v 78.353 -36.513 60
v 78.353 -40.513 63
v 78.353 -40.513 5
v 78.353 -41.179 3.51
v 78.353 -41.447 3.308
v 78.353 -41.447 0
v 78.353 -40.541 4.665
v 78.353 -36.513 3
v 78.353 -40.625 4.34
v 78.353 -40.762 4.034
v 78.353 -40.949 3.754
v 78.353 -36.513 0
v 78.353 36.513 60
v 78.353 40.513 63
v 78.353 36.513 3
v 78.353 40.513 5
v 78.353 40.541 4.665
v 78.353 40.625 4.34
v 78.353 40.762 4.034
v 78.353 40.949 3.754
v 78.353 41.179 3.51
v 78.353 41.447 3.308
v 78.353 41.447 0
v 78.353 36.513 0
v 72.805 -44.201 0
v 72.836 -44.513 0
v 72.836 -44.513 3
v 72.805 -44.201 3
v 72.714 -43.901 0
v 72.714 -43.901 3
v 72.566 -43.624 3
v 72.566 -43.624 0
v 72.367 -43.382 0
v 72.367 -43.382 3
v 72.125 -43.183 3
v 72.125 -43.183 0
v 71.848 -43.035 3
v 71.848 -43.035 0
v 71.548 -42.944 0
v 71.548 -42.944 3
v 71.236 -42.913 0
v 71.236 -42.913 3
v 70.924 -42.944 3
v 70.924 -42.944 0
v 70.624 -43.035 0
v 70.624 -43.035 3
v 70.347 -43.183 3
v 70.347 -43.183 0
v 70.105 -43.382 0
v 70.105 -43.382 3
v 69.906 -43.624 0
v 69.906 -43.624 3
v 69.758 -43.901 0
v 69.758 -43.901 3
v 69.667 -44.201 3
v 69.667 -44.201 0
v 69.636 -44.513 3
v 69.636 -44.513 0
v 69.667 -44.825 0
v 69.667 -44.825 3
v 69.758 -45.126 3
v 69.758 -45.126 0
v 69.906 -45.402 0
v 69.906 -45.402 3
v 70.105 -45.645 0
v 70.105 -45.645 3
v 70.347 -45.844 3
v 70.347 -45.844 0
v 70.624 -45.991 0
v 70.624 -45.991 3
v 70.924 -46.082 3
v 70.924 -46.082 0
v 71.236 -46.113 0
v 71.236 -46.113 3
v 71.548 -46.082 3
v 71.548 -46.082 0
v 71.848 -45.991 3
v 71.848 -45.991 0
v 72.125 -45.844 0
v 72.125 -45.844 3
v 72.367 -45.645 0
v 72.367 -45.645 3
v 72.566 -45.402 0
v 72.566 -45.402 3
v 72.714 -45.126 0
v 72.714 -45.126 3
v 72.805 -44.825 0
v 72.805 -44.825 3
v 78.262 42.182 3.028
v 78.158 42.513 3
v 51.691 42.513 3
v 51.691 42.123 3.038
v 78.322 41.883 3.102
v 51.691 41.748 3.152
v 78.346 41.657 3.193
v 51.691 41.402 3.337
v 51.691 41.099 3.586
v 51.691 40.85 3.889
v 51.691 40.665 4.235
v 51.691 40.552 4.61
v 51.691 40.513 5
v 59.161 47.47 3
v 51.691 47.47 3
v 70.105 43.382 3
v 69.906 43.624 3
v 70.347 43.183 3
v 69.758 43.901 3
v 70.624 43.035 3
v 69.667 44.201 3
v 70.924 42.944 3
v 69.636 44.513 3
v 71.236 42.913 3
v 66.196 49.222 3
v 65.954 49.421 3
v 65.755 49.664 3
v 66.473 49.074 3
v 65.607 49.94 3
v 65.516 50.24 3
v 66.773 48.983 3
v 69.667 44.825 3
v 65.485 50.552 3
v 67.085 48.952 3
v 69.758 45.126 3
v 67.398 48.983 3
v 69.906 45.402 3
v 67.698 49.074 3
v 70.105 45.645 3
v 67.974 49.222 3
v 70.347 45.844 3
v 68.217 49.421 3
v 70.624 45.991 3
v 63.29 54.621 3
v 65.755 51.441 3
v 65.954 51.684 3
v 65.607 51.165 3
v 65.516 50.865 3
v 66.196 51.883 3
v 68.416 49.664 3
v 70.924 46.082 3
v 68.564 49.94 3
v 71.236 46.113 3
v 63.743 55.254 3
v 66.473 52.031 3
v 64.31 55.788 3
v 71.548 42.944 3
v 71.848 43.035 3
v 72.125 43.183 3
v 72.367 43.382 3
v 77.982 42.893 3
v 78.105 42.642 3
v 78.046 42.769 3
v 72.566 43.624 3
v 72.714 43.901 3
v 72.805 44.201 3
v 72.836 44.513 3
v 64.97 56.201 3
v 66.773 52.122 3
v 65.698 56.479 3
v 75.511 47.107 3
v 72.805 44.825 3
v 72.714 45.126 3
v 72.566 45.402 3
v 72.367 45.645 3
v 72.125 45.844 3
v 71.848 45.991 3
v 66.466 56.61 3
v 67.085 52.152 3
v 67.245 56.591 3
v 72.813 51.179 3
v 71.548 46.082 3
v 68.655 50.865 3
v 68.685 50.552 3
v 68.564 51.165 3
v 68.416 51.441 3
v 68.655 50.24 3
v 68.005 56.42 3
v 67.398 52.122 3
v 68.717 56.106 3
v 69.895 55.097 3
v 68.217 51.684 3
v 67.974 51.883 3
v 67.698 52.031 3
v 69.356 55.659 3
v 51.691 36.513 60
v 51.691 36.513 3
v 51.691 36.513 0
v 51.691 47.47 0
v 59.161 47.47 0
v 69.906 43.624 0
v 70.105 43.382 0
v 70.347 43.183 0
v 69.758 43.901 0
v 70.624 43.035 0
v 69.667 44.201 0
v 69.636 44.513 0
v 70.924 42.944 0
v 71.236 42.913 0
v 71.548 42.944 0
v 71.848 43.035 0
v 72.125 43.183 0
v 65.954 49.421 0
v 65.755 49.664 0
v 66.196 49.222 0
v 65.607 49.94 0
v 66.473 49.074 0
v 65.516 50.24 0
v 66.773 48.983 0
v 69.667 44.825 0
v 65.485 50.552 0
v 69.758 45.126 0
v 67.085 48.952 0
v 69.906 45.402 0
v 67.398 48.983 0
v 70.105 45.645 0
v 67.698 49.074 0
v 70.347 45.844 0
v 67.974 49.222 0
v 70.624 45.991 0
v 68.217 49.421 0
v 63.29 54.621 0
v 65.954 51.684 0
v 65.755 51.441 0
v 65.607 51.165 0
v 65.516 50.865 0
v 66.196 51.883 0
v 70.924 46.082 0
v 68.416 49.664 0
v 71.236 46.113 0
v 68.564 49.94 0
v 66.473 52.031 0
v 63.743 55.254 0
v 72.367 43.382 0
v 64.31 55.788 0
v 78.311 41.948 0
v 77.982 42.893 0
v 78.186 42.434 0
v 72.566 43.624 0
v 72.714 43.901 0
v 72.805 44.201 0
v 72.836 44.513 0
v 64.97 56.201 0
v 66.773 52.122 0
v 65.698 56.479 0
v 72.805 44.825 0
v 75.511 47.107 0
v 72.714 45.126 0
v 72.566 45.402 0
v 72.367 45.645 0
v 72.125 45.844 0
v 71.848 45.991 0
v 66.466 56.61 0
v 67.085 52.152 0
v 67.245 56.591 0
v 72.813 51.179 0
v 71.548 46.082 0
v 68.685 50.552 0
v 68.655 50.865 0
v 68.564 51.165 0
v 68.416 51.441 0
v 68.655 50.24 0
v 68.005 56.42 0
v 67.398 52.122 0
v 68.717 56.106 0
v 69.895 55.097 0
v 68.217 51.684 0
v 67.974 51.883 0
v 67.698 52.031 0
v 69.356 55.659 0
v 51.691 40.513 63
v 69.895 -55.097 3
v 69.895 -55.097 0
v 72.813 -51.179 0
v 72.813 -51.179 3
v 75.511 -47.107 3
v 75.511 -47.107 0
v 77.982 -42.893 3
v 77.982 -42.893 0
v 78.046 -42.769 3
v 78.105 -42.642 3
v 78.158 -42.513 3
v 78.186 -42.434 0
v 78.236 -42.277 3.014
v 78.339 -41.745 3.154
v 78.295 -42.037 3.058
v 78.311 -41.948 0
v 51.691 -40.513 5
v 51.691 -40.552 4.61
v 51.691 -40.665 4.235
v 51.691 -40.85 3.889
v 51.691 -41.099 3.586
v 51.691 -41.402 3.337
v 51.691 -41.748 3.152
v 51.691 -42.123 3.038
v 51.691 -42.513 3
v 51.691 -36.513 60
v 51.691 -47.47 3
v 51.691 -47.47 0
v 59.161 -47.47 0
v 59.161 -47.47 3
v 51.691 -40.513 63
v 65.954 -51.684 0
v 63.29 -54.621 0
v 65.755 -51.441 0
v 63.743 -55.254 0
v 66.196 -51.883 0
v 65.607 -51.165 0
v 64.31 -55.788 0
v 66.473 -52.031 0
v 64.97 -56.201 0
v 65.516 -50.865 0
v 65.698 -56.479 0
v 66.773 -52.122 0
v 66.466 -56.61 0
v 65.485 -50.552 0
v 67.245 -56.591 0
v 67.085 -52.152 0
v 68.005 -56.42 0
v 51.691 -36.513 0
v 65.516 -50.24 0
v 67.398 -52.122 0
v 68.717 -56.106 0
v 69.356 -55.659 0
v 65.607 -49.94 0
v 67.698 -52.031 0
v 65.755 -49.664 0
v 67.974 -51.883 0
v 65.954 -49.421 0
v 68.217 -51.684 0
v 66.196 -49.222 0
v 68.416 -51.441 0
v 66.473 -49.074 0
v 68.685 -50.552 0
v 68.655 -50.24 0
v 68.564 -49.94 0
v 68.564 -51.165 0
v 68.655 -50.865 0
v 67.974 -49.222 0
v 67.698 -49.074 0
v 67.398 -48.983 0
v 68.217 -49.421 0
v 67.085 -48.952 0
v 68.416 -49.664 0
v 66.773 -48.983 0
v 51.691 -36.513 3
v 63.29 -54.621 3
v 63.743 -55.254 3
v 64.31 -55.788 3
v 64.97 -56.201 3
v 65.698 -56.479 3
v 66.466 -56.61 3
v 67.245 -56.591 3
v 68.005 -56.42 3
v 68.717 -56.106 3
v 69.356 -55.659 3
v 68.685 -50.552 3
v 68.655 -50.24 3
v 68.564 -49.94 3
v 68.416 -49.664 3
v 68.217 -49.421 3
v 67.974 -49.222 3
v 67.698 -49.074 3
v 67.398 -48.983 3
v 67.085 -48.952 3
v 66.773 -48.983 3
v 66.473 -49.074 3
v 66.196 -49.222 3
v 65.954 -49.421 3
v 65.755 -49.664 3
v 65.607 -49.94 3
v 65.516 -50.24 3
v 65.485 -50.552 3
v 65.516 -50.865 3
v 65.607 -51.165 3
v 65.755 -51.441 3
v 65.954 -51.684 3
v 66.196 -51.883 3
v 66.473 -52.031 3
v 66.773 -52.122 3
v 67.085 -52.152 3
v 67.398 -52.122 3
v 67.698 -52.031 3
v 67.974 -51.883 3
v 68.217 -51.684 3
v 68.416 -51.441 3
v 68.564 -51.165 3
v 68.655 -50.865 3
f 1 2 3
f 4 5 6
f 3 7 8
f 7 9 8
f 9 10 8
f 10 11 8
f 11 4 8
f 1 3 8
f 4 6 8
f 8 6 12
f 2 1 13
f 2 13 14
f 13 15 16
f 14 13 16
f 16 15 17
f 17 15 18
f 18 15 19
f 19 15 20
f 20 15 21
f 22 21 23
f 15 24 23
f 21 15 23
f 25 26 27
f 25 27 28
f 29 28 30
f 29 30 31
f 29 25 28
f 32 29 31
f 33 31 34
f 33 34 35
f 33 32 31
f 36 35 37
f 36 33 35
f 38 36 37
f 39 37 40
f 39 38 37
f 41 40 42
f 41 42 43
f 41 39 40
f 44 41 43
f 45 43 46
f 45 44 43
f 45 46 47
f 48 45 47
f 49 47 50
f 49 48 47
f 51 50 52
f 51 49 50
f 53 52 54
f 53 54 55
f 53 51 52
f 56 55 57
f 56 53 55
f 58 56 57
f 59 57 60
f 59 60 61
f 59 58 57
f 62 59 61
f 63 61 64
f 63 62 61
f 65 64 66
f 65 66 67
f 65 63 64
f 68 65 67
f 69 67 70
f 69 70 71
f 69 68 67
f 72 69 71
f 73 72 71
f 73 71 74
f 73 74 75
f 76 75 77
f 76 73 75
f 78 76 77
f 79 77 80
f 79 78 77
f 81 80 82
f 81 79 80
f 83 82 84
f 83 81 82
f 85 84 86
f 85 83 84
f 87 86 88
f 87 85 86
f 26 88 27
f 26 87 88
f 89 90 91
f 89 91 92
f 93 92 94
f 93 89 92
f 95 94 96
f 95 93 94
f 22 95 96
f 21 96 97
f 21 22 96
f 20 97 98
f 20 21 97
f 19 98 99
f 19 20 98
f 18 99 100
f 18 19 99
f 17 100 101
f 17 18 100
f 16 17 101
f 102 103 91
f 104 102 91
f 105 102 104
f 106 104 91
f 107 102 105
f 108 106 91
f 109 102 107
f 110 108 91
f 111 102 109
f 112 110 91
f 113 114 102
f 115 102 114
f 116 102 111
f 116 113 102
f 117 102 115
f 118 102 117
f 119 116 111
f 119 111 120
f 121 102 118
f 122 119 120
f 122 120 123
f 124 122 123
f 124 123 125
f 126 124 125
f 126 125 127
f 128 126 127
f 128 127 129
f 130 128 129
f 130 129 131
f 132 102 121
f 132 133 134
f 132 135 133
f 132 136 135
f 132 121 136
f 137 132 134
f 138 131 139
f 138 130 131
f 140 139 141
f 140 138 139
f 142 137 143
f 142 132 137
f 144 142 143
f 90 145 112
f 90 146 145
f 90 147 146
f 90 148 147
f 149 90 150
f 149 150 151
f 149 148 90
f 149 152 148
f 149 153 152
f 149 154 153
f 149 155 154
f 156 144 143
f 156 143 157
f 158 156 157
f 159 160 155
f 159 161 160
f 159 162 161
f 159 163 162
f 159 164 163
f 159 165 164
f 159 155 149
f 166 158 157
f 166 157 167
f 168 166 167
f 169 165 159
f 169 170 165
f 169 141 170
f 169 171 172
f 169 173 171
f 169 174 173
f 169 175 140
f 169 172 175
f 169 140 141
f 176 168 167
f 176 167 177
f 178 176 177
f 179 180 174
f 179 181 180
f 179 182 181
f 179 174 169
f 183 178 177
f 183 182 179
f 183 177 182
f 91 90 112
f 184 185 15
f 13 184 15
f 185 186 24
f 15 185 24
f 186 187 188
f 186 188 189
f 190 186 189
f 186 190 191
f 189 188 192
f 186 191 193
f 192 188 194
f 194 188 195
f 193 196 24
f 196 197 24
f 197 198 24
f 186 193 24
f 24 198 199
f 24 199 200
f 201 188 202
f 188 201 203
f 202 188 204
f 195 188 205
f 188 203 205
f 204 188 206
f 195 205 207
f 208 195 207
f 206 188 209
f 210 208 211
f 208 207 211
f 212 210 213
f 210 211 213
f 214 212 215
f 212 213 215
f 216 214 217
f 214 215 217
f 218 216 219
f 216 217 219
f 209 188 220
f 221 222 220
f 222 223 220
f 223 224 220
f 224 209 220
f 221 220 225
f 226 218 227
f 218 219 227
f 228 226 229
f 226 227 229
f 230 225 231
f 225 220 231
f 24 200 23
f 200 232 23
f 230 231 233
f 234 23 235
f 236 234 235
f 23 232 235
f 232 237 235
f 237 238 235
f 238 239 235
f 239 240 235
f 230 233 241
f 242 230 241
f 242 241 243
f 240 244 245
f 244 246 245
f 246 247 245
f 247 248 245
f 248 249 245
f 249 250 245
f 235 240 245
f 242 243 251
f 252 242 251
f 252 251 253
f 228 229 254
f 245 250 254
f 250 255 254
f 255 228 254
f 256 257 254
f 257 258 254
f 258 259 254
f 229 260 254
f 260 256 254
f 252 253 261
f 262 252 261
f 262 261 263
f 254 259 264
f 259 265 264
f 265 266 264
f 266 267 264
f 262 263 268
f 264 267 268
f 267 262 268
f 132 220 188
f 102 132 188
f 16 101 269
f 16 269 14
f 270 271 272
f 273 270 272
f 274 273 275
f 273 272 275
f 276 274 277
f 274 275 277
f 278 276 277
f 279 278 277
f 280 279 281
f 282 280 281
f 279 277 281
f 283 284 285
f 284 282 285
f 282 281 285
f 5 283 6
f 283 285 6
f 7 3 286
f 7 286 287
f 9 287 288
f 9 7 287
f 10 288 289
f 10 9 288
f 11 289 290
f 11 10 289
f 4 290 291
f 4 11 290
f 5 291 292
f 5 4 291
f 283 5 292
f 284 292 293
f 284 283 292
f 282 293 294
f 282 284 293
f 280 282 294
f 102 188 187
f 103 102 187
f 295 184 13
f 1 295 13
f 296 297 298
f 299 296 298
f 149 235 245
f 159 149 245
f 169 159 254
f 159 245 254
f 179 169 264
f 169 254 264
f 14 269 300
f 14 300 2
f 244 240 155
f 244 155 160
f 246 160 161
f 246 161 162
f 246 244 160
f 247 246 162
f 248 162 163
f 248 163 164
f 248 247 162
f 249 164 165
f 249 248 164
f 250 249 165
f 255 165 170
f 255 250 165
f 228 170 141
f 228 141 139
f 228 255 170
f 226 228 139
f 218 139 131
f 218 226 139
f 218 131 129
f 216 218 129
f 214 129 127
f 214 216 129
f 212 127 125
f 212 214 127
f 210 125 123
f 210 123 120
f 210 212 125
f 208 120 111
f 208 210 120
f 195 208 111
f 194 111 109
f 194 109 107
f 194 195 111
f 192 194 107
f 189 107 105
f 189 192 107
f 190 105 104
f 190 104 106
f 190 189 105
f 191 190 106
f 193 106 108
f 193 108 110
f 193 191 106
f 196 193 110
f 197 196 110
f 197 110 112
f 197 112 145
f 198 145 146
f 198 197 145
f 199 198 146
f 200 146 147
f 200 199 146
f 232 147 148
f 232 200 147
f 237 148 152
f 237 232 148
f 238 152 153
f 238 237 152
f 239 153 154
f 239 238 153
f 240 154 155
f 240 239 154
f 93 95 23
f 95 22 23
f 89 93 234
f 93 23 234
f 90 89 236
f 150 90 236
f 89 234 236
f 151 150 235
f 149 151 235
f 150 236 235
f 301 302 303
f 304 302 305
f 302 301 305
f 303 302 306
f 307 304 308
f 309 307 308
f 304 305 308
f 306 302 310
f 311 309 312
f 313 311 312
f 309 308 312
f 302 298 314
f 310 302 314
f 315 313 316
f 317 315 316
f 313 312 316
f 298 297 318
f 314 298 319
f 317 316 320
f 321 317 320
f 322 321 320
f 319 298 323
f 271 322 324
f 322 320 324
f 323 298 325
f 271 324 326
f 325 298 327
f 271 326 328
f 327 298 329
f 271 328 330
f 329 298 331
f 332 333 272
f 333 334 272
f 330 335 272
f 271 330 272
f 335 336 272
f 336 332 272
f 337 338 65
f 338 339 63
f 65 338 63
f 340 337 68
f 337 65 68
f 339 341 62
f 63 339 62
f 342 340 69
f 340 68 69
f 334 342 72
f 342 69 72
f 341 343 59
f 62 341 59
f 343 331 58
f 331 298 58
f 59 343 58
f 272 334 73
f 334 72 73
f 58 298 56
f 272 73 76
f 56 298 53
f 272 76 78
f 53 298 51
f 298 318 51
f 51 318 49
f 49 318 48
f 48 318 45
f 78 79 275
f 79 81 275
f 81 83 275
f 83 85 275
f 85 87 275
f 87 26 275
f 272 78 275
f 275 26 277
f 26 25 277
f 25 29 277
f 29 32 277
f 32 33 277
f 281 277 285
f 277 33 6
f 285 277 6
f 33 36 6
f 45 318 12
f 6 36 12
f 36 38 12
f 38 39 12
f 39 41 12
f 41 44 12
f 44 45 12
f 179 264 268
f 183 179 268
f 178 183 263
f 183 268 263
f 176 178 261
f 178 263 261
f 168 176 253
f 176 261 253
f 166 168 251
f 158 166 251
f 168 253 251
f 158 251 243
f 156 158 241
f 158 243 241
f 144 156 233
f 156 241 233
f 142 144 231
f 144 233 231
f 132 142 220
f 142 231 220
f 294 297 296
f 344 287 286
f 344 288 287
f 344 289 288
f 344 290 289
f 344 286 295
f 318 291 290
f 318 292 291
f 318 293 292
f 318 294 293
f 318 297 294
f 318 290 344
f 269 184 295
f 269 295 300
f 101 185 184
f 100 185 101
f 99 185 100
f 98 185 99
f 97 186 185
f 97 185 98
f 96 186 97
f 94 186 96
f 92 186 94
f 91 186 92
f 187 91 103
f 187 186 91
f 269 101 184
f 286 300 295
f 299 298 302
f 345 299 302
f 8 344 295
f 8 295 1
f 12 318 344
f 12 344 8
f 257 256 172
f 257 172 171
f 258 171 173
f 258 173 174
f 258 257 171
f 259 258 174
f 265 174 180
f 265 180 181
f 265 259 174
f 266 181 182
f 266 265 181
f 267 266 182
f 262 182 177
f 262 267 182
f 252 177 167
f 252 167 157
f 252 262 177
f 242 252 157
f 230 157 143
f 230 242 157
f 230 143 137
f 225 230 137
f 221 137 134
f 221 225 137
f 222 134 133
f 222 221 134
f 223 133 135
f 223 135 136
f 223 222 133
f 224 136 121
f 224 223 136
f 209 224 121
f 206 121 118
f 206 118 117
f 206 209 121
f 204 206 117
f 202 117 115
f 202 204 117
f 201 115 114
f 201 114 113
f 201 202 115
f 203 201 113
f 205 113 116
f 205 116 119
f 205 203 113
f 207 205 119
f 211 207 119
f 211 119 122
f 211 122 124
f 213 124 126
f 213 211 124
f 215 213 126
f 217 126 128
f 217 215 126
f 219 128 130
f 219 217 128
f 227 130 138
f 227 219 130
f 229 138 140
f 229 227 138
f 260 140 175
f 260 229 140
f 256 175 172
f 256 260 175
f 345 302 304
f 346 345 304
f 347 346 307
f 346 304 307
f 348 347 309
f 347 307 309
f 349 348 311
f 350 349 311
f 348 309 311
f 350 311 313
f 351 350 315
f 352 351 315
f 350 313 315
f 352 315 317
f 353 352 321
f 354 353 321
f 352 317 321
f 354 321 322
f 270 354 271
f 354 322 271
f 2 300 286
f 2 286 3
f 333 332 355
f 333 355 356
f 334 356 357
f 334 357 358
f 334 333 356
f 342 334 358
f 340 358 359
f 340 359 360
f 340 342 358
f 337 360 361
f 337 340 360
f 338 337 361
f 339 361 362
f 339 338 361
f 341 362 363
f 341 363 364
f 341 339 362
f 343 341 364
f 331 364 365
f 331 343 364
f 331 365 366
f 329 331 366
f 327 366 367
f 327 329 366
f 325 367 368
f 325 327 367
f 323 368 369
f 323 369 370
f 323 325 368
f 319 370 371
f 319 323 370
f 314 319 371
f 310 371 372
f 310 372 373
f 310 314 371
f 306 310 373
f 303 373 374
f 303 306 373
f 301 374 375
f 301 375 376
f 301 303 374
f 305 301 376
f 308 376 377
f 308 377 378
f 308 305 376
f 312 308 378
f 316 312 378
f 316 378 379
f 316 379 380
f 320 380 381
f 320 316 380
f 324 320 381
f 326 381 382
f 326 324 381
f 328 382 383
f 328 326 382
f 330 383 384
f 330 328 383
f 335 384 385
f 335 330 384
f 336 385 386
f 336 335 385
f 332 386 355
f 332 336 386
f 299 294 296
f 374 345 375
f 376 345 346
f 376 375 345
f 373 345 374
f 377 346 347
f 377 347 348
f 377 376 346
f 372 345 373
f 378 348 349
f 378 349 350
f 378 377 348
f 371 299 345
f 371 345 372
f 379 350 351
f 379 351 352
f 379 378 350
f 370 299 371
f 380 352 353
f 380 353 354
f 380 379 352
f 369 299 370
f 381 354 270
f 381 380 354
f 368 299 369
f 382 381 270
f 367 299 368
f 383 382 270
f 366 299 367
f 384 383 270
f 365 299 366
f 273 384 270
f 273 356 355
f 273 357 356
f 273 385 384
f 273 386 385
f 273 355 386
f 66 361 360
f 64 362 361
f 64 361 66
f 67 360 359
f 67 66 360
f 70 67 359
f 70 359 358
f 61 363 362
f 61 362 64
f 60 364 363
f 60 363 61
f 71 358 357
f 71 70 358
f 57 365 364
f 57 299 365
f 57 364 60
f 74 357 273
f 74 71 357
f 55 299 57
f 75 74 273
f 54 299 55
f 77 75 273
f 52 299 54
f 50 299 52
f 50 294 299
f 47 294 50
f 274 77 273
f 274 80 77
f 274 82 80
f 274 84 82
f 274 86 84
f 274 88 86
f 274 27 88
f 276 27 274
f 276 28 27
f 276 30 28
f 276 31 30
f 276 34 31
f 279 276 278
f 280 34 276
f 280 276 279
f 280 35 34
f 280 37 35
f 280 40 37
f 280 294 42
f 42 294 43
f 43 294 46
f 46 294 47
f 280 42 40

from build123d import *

# Parameters (mm, degrees)
BOSS_EXTRUDE1_OUTLINE_R = 1.6
BOSS_EXTRUDE1_DEPTH     = 3
SKETCH4_W               = 26.662281873
SKETCH4_H               = 4
BOSS_EXTRUDE2_DEPTH     = 57
SKETCH5_W               = 26.662281873
SKETCH5_H               = 81.026436392
BOSS_EXTRUDE3_DEPTH     = 3
FILLET3_R               = 2


# Read off the part's stored shape, not the designer's step: Boss-Extrude1
with BuildPart() as part:
    # Boss-Extrude1 outline → Boss-Extrude1 (new body)
    # profile 1 of 2: a face of its own
    with BuildSketch(Plane.XY):
        with BuildLine():
            ThreePointArc((63.289582375, -54.620772264), (66.466019523, -56.610414999), (69.895033825, -55.0970439))
            ThreePointArc((69.895033825, -55.0970439), (74.189882191, -49.161584399), (77.981994569, -42.892989206))
            ThreePointArc((77.981994569, -42.892989206), (78.25905658, -42.193542837), (78.353388011, -41.447158109))
            Line((78.353388011, -41.447158109), (78.353388011, -36.513218196))
            Line((78.353388011, -36.513218196), (51.691106138, -36.513218196))
            Line((51.691106138, -36.513218196), (51.691106138, -47.469854476))
            Line((51.691106138, -47.469854476), (59.160998066, -47.469854476))
            Line((59.160998066, -47.469854476), (63.289582375, -54.620772264))
        make_face()
        with Locations((67.085382844, -50.552461945)):
            Circle(BOSS_EXTRUDE1_OUTLINE_R, mode=Mode.SUBTRACT)
        with Locations((71.236040077, -44.513218196)):
            Circle(BOSS_EXTRUDE1_OUTLINE_R, mode=Mode.SUBTRACT)
    # profile 2 of 2: a face of its own
    with BuildSketch(Plane.XY):
        with BuildLine():
            Line((78.353388011, 36.513218196), (78.353388011, 41.447158109))
            ThreePointArc((78.353388011, 41.447158109), (78.25905658, 42.193542837), (77.981994569, 42.892989206))
            ThreePointArc((77.981994569, 42.892989206), (74.189882191, 49.161584398), (69.895033826, 55.0970439))
            ThreePointArc((69.895033826, 55.0970439), (66.466019523, 56.610414999), (63.289582375, 54.620772264))
            Line((63.289582375, 54.620772264), (59.160998066, 47.469854476))
            Line((59.160998066, 47.469854476), (51.691106138, 47.469854476))
            Line((51.691106138, 47.469854476), (51.691106138, 36.513218196))
            Line((51.691106138, 36.513218196), (78.353388011, 36.513218196))
        make_face()
        with Locations((67.085382844, 50.552461945)):
            Circle(BOSS_EXTRUDE1_OUTLINE_R, mode=Mode.SUBTRACT)
        with Locations((71.236040077, 44.513218196)):
            Circle(BOSS_EXTRUDE1_OUTLINE_R, mode=Mode.SUBTRACT)
    extrude(amount=BOSS_EXTRUDE1_DEPTH)

    # Sketch4 → Boss-Extrude2 (add)
    with BuildSketch(Plane.XY.offset(3)):
        with Locations((65.022247075, 38.513218196)):
            Rectangle(SKETCH4_W, SKETCH4_H)
        with Locations((65.022247075, -38.513218196)):
            Rectangle(SKETCH4_W, SKETCH4_H)
    extrude(amount=BOSS_EXTRUDE2_DEPTH)

    # Sketch5 → Boss-Extrude3 (add)
    with BuildSketch(Plane.XY.offset(60)):
        with Locations((65.022247075, 0)):
            Rectangle(SKETCH5_W, SKETCH5_H)
    extrude(amount=BOSS_EXTRUDE3_DEPTH)

    # Fillet3
    fillet3_edges = [part.edges().sort_by_distance(p)[0] for p in [
        (65.022247075, -40.513218196, 3),
        (65.022247075, 40.513218196, 3),
    ]]
    fillet(fillet3_edges, radius=FILLET3_R)


solid = part.part
